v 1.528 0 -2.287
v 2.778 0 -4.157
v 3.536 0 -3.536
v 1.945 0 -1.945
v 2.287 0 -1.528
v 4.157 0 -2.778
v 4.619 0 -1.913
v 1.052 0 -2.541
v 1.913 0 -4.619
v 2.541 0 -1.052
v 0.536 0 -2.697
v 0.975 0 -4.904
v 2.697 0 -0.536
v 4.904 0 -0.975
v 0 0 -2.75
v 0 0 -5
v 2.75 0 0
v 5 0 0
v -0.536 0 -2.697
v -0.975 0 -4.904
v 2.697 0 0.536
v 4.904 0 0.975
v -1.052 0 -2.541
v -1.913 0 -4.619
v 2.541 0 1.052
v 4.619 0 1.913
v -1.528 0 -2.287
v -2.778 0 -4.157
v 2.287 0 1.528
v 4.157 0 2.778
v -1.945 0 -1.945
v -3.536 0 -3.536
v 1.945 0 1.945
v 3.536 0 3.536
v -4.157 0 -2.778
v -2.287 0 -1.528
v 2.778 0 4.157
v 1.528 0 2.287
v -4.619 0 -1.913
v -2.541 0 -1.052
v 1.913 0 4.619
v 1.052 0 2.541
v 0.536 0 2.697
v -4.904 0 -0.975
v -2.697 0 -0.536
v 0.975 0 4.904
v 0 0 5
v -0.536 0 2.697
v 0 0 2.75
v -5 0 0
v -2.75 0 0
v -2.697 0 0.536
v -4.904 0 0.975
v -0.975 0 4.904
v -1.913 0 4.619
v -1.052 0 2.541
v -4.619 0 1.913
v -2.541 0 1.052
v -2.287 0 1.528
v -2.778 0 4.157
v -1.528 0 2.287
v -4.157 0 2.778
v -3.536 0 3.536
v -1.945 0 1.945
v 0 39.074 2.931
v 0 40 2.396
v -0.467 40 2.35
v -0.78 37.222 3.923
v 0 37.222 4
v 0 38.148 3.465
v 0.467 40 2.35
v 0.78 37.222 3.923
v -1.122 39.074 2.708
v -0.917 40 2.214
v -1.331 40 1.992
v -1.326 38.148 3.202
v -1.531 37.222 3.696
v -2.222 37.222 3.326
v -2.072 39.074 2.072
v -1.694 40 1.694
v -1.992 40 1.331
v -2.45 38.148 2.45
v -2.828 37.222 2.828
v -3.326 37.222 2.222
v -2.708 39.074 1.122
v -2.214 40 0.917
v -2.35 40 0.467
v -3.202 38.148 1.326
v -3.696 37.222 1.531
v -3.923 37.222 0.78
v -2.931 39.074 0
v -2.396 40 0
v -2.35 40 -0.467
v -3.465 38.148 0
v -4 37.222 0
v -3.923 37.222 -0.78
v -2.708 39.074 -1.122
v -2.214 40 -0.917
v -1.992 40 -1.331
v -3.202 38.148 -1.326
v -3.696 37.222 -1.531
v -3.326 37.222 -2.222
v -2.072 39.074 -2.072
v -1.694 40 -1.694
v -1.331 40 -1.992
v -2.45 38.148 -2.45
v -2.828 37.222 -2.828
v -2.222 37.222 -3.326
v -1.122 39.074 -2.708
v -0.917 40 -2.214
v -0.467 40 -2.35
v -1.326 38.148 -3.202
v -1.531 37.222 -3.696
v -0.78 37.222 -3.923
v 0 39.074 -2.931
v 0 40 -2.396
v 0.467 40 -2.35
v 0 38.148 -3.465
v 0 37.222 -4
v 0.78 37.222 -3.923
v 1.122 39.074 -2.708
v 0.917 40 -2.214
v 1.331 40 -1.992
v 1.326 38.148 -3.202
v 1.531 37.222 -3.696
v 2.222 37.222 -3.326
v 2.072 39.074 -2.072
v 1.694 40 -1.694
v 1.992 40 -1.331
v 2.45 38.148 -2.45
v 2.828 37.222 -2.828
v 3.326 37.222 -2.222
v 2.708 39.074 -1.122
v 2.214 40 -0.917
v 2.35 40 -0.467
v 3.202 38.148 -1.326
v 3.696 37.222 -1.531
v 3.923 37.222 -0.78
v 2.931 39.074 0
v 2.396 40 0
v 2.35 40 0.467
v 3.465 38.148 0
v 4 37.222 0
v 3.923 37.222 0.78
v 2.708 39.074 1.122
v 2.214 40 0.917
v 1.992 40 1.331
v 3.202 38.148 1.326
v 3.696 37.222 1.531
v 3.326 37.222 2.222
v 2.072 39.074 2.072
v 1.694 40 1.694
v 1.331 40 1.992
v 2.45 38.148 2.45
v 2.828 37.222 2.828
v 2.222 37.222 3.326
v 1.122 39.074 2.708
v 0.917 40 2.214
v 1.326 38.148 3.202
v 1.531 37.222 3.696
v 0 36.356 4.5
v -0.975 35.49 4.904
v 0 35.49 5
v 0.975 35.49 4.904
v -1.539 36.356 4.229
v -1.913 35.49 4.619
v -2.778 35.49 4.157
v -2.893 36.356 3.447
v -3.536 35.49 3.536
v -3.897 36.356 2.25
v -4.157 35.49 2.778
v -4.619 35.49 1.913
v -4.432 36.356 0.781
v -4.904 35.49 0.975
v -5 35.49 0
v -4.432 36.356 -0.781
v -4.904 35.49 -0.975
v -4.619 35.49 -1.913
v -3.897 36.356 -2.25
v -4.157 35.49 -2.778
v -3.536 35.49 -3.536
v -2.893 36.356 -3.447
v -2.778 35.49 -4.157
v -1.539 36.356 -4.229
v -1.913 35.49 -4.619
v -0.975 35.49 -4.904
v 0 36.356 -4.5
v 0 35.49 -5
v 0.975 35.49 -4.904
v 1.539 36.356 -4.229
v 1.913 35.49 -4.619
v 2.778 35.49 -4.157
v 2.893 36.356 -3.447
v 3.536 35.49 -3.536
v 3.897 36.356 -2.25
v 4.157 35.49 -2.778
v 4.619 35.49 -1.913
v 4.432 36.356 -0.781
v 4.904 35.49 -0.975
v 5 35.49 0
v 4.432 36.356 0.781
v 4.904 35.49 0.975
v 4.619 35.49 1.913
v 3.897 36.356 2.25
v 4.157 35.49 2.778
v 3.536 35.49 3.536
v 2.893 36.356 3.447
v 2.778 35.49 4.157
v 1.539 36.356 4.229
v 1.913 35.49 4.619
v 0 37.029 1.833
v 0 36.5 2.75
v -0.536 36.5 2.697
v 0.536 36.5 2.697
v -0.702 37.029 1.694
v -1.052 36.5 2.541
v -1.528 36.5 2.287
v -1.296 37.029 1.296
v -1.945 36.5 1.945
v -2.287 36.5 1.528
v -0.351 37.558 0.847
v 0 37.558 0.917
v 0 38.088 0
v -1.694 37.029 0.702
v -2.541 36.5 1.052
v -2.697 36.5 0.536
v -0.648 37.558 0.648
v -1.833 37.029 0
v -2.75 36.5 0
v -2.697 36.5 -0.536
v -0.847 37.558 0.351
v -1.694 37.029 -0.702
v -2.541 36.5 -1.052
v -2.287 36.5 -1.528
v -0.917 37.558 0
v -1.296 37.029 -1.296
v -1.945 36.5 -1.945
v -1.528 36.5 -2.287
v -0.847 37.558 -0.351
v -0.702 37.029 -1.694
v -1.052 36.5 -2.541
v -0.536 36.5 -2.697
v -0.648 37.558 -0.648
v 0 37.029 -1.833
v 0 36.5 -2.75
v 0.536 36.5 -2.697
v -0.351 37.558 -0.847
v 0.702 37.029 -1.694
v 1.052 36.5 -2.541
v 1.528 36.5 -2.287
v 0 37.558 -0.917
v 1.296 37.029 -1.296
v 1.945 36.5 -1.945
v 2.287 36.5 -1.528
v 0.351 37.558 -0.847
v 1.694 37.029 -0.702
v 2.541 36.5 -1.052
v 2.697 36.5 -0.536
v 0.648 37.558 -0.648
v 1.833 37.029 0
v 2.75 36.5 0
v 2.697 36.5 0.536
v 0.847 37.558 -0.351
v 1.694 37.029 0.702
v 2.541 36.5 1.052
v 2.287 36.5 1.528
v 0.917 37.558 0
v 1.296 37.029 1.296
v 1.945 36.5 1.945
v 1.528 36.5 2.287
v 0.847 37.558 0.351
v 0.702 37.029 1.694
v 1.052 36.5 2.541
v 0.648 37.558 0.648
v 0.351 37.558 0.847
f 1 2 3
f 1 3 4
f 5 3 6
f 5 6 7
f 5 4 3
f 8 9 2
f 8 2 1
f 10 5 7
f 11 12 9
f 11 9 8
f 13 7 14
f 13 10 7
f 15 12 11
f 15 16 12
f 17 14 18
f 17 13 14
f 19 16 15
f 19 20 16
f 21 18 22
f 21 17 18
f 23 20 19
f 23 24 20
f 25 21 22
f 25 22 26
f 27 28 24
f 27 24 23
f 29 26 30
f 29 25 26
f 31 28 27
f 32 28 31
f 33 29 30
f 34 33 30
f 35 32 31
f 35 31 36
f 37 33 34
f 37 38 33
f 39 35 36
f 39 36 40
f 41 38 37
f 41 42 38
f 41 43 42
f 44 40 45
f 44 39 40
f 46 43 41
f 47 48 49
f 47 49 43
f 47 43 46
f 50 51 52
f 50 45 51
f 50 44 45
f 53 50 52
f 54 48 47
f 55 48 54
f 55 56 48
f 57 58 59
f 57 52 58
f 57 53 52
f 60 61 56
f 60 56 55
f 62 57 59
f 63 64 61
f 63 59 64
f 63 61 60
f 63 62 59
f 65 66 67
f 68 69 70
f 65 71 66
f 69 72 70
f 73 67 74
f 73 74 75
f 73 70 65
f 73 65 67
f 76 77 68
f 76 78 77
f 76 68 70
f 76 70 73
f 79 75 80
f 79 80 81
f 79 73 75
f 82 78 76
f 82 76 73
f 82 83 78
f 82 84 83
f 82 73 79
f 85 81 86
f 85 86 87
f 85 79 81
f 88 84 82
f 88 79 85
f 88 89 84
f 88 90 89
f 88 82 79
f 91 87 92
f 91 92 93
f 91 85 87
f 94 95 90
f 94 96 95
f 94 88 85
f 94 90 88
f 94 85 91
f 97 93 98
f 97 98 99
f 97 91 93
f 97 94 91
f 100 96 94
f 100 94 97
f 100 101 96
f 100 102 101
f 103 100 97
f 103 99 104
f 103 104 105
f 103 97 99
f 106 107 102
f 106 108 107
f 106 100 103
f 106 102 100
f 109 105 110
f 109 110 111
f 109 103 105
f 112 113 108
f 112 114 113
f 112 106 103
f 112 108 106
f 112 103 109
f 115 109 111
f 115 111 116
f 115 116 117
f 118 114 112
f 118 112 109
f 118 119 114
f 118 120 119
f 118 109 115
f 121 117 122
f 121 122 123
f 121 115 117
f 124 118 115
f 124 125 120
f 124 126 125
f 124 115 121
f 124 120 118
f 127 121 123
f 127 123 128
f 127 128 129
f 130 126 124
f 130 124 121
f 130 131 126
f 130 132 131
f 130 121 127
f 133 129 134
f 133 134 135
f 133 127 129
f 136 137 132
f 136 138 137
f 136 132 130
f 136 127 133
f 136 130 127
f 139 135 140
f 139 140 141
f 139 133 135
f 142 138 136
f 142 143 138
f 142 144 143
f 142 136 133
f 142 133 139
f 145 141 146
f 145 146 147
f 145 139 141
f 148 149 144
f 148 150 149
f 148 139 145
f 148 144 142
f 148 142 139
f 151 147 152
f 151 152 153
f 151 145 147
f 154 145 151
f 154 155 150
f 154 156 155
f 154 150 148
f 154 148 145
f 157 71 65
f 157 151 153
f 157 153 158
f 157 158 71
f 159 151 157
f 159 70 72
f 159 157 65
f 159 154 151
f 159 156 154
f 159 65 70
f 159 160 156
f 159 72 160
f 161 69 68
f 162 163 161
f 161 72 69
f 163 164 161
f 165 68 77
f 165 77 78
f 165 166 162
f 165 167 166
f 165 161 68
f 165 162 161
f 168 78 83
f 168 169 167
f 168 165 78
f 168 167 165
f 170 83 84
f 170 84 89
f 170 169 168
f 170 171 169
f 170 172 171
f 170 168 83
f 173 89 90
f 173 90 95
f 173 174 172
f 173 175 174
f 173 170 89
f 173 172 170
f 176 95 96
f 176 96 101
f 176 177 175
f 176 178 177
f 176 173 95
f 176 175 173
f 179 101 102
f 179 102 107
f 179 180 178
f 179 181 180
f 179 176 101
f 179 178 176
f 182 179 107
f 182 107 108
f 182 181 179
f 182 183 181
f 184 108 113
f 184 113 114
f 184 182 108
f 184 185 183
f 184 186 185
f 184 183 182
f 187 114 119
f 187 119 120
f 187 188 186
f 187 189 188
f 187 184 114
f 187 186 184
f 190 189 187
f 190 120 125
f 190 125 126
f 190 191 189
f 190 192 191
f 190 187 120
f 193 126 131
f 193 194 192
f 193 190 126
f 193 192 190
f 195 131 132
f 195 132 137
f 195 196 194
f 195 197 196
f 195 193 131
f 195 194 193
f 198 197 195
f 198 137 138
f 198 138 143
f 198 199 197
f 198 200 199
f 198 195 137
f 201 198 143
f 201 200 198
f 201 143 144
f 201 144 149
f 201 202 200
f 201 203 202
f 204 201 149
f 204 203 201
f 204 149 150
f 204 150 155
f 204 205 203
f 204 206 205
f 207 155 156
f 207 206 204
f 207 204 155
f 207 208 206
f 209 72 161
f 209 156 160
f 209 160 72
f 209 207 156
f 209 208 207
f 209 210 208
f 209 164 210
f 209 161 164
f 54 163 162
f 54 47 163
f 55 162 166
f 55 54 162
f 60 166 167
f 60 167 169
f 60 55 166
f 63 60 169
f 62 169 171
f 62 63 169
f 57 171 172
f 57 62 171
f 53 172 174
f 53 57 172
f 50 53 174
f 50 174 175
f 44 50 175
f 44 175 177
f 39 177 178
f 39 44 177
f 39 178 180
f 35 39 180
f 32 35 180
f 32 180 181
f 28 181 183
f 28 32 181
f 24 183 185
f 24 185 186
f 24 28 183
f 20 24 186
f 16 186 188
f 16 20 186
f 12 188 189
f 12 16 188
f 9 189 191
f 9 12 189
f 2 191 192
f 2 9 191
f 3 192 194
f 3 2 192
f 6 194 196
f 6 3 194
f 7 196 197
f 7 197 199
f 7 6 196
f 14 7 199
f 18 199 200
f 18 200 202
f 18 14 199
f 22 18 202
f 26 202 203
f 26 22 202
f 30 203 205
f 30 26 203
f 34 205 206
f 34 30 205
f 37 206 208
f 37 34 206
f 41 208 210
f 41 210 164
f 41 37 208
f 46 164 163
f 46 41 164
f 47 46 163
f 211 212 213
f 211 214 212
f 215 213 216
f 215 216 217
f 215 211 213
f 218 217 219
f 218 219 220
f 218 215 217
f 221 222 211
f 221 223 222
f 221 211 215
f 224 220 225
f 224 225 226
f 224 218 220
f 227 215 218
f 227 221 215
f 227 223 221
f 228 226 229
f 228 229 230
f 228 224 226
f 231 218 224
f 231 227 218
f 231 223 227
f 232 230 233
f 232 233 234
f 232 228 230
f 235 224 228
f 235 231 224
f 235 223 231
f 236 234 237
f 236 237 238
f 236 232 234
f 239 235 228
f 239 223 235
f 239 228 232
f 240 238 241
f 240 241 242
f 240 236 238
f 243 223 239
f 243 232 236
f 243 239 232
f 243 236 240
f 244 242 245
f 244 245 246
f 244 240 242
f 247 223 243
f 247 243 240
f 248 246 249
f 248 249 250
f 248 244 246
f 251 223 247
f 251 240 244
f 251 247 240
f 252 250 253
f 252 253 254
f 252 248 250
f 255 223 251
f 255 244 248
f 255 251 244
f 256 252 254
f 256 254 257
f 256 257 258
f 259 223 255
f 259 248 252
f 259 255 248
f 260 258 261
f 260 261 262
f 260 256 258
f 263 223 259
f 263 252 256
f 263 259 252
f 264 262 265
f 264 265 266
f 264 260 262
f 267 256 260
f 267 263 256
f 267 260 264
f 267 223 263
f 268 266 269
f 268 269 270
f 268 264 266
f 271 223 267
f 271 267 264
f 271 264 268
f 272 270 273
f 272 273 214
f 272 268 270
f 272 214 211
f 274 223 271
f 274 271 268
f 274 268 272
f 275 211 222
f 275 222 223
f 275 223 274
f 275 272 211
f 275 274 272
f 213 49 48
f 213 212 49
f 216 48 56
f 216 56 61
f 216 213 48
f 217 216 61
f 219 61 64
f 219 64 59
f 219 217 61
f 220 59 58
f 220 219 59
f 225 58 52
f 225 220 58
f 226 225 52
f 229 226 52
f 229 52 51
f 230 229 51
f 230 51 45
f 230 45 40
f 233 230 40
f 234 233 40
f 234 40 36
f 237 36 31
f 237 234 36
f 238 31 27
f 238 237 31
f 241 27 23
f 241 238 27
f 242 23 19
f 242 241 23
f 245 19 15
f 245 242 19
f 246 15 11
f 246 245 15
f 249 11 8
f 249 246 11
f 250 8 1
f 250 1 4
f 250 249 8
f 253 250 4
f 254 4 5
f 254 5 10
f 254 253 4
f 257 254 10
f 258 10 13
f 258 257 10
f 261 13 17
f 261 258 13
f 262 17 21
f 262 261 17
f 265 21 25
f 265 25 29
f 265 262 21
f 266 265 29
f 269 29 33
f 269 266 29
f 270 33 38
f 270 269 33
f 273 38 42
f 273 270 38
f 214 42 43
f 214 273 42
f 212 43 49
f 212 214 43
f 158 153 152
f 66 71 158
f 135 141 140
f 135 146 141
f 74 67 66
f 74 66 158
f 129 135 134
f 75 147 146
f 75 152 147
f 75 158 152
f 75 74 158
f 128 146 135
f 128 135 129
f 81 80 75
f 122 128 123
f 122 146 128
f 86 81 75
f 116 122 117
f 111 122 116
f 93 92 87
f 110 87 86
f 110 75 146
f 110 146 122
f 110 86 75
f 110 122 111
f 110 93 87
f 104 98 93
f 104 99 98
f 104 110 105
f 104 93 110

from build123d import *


with BuildPart() as f1:
    # F0 (on Right) → F1 (revolve)
    with BuildSketch(Plane.YZ):
        Polygon((35.489637, 5), (0, 5), (0, 2.75), (36.5, 2.75), (37.221688, 4), align=None)
        Polygon((40, 2.395941), (37.221688, 4), (36.5, 2.75), (38.087713, 0), (40, 0), align=None)
    revolve(axis=Axis((0, 39.043857, 0), (0, -1, 0)))


solid = f1.part
